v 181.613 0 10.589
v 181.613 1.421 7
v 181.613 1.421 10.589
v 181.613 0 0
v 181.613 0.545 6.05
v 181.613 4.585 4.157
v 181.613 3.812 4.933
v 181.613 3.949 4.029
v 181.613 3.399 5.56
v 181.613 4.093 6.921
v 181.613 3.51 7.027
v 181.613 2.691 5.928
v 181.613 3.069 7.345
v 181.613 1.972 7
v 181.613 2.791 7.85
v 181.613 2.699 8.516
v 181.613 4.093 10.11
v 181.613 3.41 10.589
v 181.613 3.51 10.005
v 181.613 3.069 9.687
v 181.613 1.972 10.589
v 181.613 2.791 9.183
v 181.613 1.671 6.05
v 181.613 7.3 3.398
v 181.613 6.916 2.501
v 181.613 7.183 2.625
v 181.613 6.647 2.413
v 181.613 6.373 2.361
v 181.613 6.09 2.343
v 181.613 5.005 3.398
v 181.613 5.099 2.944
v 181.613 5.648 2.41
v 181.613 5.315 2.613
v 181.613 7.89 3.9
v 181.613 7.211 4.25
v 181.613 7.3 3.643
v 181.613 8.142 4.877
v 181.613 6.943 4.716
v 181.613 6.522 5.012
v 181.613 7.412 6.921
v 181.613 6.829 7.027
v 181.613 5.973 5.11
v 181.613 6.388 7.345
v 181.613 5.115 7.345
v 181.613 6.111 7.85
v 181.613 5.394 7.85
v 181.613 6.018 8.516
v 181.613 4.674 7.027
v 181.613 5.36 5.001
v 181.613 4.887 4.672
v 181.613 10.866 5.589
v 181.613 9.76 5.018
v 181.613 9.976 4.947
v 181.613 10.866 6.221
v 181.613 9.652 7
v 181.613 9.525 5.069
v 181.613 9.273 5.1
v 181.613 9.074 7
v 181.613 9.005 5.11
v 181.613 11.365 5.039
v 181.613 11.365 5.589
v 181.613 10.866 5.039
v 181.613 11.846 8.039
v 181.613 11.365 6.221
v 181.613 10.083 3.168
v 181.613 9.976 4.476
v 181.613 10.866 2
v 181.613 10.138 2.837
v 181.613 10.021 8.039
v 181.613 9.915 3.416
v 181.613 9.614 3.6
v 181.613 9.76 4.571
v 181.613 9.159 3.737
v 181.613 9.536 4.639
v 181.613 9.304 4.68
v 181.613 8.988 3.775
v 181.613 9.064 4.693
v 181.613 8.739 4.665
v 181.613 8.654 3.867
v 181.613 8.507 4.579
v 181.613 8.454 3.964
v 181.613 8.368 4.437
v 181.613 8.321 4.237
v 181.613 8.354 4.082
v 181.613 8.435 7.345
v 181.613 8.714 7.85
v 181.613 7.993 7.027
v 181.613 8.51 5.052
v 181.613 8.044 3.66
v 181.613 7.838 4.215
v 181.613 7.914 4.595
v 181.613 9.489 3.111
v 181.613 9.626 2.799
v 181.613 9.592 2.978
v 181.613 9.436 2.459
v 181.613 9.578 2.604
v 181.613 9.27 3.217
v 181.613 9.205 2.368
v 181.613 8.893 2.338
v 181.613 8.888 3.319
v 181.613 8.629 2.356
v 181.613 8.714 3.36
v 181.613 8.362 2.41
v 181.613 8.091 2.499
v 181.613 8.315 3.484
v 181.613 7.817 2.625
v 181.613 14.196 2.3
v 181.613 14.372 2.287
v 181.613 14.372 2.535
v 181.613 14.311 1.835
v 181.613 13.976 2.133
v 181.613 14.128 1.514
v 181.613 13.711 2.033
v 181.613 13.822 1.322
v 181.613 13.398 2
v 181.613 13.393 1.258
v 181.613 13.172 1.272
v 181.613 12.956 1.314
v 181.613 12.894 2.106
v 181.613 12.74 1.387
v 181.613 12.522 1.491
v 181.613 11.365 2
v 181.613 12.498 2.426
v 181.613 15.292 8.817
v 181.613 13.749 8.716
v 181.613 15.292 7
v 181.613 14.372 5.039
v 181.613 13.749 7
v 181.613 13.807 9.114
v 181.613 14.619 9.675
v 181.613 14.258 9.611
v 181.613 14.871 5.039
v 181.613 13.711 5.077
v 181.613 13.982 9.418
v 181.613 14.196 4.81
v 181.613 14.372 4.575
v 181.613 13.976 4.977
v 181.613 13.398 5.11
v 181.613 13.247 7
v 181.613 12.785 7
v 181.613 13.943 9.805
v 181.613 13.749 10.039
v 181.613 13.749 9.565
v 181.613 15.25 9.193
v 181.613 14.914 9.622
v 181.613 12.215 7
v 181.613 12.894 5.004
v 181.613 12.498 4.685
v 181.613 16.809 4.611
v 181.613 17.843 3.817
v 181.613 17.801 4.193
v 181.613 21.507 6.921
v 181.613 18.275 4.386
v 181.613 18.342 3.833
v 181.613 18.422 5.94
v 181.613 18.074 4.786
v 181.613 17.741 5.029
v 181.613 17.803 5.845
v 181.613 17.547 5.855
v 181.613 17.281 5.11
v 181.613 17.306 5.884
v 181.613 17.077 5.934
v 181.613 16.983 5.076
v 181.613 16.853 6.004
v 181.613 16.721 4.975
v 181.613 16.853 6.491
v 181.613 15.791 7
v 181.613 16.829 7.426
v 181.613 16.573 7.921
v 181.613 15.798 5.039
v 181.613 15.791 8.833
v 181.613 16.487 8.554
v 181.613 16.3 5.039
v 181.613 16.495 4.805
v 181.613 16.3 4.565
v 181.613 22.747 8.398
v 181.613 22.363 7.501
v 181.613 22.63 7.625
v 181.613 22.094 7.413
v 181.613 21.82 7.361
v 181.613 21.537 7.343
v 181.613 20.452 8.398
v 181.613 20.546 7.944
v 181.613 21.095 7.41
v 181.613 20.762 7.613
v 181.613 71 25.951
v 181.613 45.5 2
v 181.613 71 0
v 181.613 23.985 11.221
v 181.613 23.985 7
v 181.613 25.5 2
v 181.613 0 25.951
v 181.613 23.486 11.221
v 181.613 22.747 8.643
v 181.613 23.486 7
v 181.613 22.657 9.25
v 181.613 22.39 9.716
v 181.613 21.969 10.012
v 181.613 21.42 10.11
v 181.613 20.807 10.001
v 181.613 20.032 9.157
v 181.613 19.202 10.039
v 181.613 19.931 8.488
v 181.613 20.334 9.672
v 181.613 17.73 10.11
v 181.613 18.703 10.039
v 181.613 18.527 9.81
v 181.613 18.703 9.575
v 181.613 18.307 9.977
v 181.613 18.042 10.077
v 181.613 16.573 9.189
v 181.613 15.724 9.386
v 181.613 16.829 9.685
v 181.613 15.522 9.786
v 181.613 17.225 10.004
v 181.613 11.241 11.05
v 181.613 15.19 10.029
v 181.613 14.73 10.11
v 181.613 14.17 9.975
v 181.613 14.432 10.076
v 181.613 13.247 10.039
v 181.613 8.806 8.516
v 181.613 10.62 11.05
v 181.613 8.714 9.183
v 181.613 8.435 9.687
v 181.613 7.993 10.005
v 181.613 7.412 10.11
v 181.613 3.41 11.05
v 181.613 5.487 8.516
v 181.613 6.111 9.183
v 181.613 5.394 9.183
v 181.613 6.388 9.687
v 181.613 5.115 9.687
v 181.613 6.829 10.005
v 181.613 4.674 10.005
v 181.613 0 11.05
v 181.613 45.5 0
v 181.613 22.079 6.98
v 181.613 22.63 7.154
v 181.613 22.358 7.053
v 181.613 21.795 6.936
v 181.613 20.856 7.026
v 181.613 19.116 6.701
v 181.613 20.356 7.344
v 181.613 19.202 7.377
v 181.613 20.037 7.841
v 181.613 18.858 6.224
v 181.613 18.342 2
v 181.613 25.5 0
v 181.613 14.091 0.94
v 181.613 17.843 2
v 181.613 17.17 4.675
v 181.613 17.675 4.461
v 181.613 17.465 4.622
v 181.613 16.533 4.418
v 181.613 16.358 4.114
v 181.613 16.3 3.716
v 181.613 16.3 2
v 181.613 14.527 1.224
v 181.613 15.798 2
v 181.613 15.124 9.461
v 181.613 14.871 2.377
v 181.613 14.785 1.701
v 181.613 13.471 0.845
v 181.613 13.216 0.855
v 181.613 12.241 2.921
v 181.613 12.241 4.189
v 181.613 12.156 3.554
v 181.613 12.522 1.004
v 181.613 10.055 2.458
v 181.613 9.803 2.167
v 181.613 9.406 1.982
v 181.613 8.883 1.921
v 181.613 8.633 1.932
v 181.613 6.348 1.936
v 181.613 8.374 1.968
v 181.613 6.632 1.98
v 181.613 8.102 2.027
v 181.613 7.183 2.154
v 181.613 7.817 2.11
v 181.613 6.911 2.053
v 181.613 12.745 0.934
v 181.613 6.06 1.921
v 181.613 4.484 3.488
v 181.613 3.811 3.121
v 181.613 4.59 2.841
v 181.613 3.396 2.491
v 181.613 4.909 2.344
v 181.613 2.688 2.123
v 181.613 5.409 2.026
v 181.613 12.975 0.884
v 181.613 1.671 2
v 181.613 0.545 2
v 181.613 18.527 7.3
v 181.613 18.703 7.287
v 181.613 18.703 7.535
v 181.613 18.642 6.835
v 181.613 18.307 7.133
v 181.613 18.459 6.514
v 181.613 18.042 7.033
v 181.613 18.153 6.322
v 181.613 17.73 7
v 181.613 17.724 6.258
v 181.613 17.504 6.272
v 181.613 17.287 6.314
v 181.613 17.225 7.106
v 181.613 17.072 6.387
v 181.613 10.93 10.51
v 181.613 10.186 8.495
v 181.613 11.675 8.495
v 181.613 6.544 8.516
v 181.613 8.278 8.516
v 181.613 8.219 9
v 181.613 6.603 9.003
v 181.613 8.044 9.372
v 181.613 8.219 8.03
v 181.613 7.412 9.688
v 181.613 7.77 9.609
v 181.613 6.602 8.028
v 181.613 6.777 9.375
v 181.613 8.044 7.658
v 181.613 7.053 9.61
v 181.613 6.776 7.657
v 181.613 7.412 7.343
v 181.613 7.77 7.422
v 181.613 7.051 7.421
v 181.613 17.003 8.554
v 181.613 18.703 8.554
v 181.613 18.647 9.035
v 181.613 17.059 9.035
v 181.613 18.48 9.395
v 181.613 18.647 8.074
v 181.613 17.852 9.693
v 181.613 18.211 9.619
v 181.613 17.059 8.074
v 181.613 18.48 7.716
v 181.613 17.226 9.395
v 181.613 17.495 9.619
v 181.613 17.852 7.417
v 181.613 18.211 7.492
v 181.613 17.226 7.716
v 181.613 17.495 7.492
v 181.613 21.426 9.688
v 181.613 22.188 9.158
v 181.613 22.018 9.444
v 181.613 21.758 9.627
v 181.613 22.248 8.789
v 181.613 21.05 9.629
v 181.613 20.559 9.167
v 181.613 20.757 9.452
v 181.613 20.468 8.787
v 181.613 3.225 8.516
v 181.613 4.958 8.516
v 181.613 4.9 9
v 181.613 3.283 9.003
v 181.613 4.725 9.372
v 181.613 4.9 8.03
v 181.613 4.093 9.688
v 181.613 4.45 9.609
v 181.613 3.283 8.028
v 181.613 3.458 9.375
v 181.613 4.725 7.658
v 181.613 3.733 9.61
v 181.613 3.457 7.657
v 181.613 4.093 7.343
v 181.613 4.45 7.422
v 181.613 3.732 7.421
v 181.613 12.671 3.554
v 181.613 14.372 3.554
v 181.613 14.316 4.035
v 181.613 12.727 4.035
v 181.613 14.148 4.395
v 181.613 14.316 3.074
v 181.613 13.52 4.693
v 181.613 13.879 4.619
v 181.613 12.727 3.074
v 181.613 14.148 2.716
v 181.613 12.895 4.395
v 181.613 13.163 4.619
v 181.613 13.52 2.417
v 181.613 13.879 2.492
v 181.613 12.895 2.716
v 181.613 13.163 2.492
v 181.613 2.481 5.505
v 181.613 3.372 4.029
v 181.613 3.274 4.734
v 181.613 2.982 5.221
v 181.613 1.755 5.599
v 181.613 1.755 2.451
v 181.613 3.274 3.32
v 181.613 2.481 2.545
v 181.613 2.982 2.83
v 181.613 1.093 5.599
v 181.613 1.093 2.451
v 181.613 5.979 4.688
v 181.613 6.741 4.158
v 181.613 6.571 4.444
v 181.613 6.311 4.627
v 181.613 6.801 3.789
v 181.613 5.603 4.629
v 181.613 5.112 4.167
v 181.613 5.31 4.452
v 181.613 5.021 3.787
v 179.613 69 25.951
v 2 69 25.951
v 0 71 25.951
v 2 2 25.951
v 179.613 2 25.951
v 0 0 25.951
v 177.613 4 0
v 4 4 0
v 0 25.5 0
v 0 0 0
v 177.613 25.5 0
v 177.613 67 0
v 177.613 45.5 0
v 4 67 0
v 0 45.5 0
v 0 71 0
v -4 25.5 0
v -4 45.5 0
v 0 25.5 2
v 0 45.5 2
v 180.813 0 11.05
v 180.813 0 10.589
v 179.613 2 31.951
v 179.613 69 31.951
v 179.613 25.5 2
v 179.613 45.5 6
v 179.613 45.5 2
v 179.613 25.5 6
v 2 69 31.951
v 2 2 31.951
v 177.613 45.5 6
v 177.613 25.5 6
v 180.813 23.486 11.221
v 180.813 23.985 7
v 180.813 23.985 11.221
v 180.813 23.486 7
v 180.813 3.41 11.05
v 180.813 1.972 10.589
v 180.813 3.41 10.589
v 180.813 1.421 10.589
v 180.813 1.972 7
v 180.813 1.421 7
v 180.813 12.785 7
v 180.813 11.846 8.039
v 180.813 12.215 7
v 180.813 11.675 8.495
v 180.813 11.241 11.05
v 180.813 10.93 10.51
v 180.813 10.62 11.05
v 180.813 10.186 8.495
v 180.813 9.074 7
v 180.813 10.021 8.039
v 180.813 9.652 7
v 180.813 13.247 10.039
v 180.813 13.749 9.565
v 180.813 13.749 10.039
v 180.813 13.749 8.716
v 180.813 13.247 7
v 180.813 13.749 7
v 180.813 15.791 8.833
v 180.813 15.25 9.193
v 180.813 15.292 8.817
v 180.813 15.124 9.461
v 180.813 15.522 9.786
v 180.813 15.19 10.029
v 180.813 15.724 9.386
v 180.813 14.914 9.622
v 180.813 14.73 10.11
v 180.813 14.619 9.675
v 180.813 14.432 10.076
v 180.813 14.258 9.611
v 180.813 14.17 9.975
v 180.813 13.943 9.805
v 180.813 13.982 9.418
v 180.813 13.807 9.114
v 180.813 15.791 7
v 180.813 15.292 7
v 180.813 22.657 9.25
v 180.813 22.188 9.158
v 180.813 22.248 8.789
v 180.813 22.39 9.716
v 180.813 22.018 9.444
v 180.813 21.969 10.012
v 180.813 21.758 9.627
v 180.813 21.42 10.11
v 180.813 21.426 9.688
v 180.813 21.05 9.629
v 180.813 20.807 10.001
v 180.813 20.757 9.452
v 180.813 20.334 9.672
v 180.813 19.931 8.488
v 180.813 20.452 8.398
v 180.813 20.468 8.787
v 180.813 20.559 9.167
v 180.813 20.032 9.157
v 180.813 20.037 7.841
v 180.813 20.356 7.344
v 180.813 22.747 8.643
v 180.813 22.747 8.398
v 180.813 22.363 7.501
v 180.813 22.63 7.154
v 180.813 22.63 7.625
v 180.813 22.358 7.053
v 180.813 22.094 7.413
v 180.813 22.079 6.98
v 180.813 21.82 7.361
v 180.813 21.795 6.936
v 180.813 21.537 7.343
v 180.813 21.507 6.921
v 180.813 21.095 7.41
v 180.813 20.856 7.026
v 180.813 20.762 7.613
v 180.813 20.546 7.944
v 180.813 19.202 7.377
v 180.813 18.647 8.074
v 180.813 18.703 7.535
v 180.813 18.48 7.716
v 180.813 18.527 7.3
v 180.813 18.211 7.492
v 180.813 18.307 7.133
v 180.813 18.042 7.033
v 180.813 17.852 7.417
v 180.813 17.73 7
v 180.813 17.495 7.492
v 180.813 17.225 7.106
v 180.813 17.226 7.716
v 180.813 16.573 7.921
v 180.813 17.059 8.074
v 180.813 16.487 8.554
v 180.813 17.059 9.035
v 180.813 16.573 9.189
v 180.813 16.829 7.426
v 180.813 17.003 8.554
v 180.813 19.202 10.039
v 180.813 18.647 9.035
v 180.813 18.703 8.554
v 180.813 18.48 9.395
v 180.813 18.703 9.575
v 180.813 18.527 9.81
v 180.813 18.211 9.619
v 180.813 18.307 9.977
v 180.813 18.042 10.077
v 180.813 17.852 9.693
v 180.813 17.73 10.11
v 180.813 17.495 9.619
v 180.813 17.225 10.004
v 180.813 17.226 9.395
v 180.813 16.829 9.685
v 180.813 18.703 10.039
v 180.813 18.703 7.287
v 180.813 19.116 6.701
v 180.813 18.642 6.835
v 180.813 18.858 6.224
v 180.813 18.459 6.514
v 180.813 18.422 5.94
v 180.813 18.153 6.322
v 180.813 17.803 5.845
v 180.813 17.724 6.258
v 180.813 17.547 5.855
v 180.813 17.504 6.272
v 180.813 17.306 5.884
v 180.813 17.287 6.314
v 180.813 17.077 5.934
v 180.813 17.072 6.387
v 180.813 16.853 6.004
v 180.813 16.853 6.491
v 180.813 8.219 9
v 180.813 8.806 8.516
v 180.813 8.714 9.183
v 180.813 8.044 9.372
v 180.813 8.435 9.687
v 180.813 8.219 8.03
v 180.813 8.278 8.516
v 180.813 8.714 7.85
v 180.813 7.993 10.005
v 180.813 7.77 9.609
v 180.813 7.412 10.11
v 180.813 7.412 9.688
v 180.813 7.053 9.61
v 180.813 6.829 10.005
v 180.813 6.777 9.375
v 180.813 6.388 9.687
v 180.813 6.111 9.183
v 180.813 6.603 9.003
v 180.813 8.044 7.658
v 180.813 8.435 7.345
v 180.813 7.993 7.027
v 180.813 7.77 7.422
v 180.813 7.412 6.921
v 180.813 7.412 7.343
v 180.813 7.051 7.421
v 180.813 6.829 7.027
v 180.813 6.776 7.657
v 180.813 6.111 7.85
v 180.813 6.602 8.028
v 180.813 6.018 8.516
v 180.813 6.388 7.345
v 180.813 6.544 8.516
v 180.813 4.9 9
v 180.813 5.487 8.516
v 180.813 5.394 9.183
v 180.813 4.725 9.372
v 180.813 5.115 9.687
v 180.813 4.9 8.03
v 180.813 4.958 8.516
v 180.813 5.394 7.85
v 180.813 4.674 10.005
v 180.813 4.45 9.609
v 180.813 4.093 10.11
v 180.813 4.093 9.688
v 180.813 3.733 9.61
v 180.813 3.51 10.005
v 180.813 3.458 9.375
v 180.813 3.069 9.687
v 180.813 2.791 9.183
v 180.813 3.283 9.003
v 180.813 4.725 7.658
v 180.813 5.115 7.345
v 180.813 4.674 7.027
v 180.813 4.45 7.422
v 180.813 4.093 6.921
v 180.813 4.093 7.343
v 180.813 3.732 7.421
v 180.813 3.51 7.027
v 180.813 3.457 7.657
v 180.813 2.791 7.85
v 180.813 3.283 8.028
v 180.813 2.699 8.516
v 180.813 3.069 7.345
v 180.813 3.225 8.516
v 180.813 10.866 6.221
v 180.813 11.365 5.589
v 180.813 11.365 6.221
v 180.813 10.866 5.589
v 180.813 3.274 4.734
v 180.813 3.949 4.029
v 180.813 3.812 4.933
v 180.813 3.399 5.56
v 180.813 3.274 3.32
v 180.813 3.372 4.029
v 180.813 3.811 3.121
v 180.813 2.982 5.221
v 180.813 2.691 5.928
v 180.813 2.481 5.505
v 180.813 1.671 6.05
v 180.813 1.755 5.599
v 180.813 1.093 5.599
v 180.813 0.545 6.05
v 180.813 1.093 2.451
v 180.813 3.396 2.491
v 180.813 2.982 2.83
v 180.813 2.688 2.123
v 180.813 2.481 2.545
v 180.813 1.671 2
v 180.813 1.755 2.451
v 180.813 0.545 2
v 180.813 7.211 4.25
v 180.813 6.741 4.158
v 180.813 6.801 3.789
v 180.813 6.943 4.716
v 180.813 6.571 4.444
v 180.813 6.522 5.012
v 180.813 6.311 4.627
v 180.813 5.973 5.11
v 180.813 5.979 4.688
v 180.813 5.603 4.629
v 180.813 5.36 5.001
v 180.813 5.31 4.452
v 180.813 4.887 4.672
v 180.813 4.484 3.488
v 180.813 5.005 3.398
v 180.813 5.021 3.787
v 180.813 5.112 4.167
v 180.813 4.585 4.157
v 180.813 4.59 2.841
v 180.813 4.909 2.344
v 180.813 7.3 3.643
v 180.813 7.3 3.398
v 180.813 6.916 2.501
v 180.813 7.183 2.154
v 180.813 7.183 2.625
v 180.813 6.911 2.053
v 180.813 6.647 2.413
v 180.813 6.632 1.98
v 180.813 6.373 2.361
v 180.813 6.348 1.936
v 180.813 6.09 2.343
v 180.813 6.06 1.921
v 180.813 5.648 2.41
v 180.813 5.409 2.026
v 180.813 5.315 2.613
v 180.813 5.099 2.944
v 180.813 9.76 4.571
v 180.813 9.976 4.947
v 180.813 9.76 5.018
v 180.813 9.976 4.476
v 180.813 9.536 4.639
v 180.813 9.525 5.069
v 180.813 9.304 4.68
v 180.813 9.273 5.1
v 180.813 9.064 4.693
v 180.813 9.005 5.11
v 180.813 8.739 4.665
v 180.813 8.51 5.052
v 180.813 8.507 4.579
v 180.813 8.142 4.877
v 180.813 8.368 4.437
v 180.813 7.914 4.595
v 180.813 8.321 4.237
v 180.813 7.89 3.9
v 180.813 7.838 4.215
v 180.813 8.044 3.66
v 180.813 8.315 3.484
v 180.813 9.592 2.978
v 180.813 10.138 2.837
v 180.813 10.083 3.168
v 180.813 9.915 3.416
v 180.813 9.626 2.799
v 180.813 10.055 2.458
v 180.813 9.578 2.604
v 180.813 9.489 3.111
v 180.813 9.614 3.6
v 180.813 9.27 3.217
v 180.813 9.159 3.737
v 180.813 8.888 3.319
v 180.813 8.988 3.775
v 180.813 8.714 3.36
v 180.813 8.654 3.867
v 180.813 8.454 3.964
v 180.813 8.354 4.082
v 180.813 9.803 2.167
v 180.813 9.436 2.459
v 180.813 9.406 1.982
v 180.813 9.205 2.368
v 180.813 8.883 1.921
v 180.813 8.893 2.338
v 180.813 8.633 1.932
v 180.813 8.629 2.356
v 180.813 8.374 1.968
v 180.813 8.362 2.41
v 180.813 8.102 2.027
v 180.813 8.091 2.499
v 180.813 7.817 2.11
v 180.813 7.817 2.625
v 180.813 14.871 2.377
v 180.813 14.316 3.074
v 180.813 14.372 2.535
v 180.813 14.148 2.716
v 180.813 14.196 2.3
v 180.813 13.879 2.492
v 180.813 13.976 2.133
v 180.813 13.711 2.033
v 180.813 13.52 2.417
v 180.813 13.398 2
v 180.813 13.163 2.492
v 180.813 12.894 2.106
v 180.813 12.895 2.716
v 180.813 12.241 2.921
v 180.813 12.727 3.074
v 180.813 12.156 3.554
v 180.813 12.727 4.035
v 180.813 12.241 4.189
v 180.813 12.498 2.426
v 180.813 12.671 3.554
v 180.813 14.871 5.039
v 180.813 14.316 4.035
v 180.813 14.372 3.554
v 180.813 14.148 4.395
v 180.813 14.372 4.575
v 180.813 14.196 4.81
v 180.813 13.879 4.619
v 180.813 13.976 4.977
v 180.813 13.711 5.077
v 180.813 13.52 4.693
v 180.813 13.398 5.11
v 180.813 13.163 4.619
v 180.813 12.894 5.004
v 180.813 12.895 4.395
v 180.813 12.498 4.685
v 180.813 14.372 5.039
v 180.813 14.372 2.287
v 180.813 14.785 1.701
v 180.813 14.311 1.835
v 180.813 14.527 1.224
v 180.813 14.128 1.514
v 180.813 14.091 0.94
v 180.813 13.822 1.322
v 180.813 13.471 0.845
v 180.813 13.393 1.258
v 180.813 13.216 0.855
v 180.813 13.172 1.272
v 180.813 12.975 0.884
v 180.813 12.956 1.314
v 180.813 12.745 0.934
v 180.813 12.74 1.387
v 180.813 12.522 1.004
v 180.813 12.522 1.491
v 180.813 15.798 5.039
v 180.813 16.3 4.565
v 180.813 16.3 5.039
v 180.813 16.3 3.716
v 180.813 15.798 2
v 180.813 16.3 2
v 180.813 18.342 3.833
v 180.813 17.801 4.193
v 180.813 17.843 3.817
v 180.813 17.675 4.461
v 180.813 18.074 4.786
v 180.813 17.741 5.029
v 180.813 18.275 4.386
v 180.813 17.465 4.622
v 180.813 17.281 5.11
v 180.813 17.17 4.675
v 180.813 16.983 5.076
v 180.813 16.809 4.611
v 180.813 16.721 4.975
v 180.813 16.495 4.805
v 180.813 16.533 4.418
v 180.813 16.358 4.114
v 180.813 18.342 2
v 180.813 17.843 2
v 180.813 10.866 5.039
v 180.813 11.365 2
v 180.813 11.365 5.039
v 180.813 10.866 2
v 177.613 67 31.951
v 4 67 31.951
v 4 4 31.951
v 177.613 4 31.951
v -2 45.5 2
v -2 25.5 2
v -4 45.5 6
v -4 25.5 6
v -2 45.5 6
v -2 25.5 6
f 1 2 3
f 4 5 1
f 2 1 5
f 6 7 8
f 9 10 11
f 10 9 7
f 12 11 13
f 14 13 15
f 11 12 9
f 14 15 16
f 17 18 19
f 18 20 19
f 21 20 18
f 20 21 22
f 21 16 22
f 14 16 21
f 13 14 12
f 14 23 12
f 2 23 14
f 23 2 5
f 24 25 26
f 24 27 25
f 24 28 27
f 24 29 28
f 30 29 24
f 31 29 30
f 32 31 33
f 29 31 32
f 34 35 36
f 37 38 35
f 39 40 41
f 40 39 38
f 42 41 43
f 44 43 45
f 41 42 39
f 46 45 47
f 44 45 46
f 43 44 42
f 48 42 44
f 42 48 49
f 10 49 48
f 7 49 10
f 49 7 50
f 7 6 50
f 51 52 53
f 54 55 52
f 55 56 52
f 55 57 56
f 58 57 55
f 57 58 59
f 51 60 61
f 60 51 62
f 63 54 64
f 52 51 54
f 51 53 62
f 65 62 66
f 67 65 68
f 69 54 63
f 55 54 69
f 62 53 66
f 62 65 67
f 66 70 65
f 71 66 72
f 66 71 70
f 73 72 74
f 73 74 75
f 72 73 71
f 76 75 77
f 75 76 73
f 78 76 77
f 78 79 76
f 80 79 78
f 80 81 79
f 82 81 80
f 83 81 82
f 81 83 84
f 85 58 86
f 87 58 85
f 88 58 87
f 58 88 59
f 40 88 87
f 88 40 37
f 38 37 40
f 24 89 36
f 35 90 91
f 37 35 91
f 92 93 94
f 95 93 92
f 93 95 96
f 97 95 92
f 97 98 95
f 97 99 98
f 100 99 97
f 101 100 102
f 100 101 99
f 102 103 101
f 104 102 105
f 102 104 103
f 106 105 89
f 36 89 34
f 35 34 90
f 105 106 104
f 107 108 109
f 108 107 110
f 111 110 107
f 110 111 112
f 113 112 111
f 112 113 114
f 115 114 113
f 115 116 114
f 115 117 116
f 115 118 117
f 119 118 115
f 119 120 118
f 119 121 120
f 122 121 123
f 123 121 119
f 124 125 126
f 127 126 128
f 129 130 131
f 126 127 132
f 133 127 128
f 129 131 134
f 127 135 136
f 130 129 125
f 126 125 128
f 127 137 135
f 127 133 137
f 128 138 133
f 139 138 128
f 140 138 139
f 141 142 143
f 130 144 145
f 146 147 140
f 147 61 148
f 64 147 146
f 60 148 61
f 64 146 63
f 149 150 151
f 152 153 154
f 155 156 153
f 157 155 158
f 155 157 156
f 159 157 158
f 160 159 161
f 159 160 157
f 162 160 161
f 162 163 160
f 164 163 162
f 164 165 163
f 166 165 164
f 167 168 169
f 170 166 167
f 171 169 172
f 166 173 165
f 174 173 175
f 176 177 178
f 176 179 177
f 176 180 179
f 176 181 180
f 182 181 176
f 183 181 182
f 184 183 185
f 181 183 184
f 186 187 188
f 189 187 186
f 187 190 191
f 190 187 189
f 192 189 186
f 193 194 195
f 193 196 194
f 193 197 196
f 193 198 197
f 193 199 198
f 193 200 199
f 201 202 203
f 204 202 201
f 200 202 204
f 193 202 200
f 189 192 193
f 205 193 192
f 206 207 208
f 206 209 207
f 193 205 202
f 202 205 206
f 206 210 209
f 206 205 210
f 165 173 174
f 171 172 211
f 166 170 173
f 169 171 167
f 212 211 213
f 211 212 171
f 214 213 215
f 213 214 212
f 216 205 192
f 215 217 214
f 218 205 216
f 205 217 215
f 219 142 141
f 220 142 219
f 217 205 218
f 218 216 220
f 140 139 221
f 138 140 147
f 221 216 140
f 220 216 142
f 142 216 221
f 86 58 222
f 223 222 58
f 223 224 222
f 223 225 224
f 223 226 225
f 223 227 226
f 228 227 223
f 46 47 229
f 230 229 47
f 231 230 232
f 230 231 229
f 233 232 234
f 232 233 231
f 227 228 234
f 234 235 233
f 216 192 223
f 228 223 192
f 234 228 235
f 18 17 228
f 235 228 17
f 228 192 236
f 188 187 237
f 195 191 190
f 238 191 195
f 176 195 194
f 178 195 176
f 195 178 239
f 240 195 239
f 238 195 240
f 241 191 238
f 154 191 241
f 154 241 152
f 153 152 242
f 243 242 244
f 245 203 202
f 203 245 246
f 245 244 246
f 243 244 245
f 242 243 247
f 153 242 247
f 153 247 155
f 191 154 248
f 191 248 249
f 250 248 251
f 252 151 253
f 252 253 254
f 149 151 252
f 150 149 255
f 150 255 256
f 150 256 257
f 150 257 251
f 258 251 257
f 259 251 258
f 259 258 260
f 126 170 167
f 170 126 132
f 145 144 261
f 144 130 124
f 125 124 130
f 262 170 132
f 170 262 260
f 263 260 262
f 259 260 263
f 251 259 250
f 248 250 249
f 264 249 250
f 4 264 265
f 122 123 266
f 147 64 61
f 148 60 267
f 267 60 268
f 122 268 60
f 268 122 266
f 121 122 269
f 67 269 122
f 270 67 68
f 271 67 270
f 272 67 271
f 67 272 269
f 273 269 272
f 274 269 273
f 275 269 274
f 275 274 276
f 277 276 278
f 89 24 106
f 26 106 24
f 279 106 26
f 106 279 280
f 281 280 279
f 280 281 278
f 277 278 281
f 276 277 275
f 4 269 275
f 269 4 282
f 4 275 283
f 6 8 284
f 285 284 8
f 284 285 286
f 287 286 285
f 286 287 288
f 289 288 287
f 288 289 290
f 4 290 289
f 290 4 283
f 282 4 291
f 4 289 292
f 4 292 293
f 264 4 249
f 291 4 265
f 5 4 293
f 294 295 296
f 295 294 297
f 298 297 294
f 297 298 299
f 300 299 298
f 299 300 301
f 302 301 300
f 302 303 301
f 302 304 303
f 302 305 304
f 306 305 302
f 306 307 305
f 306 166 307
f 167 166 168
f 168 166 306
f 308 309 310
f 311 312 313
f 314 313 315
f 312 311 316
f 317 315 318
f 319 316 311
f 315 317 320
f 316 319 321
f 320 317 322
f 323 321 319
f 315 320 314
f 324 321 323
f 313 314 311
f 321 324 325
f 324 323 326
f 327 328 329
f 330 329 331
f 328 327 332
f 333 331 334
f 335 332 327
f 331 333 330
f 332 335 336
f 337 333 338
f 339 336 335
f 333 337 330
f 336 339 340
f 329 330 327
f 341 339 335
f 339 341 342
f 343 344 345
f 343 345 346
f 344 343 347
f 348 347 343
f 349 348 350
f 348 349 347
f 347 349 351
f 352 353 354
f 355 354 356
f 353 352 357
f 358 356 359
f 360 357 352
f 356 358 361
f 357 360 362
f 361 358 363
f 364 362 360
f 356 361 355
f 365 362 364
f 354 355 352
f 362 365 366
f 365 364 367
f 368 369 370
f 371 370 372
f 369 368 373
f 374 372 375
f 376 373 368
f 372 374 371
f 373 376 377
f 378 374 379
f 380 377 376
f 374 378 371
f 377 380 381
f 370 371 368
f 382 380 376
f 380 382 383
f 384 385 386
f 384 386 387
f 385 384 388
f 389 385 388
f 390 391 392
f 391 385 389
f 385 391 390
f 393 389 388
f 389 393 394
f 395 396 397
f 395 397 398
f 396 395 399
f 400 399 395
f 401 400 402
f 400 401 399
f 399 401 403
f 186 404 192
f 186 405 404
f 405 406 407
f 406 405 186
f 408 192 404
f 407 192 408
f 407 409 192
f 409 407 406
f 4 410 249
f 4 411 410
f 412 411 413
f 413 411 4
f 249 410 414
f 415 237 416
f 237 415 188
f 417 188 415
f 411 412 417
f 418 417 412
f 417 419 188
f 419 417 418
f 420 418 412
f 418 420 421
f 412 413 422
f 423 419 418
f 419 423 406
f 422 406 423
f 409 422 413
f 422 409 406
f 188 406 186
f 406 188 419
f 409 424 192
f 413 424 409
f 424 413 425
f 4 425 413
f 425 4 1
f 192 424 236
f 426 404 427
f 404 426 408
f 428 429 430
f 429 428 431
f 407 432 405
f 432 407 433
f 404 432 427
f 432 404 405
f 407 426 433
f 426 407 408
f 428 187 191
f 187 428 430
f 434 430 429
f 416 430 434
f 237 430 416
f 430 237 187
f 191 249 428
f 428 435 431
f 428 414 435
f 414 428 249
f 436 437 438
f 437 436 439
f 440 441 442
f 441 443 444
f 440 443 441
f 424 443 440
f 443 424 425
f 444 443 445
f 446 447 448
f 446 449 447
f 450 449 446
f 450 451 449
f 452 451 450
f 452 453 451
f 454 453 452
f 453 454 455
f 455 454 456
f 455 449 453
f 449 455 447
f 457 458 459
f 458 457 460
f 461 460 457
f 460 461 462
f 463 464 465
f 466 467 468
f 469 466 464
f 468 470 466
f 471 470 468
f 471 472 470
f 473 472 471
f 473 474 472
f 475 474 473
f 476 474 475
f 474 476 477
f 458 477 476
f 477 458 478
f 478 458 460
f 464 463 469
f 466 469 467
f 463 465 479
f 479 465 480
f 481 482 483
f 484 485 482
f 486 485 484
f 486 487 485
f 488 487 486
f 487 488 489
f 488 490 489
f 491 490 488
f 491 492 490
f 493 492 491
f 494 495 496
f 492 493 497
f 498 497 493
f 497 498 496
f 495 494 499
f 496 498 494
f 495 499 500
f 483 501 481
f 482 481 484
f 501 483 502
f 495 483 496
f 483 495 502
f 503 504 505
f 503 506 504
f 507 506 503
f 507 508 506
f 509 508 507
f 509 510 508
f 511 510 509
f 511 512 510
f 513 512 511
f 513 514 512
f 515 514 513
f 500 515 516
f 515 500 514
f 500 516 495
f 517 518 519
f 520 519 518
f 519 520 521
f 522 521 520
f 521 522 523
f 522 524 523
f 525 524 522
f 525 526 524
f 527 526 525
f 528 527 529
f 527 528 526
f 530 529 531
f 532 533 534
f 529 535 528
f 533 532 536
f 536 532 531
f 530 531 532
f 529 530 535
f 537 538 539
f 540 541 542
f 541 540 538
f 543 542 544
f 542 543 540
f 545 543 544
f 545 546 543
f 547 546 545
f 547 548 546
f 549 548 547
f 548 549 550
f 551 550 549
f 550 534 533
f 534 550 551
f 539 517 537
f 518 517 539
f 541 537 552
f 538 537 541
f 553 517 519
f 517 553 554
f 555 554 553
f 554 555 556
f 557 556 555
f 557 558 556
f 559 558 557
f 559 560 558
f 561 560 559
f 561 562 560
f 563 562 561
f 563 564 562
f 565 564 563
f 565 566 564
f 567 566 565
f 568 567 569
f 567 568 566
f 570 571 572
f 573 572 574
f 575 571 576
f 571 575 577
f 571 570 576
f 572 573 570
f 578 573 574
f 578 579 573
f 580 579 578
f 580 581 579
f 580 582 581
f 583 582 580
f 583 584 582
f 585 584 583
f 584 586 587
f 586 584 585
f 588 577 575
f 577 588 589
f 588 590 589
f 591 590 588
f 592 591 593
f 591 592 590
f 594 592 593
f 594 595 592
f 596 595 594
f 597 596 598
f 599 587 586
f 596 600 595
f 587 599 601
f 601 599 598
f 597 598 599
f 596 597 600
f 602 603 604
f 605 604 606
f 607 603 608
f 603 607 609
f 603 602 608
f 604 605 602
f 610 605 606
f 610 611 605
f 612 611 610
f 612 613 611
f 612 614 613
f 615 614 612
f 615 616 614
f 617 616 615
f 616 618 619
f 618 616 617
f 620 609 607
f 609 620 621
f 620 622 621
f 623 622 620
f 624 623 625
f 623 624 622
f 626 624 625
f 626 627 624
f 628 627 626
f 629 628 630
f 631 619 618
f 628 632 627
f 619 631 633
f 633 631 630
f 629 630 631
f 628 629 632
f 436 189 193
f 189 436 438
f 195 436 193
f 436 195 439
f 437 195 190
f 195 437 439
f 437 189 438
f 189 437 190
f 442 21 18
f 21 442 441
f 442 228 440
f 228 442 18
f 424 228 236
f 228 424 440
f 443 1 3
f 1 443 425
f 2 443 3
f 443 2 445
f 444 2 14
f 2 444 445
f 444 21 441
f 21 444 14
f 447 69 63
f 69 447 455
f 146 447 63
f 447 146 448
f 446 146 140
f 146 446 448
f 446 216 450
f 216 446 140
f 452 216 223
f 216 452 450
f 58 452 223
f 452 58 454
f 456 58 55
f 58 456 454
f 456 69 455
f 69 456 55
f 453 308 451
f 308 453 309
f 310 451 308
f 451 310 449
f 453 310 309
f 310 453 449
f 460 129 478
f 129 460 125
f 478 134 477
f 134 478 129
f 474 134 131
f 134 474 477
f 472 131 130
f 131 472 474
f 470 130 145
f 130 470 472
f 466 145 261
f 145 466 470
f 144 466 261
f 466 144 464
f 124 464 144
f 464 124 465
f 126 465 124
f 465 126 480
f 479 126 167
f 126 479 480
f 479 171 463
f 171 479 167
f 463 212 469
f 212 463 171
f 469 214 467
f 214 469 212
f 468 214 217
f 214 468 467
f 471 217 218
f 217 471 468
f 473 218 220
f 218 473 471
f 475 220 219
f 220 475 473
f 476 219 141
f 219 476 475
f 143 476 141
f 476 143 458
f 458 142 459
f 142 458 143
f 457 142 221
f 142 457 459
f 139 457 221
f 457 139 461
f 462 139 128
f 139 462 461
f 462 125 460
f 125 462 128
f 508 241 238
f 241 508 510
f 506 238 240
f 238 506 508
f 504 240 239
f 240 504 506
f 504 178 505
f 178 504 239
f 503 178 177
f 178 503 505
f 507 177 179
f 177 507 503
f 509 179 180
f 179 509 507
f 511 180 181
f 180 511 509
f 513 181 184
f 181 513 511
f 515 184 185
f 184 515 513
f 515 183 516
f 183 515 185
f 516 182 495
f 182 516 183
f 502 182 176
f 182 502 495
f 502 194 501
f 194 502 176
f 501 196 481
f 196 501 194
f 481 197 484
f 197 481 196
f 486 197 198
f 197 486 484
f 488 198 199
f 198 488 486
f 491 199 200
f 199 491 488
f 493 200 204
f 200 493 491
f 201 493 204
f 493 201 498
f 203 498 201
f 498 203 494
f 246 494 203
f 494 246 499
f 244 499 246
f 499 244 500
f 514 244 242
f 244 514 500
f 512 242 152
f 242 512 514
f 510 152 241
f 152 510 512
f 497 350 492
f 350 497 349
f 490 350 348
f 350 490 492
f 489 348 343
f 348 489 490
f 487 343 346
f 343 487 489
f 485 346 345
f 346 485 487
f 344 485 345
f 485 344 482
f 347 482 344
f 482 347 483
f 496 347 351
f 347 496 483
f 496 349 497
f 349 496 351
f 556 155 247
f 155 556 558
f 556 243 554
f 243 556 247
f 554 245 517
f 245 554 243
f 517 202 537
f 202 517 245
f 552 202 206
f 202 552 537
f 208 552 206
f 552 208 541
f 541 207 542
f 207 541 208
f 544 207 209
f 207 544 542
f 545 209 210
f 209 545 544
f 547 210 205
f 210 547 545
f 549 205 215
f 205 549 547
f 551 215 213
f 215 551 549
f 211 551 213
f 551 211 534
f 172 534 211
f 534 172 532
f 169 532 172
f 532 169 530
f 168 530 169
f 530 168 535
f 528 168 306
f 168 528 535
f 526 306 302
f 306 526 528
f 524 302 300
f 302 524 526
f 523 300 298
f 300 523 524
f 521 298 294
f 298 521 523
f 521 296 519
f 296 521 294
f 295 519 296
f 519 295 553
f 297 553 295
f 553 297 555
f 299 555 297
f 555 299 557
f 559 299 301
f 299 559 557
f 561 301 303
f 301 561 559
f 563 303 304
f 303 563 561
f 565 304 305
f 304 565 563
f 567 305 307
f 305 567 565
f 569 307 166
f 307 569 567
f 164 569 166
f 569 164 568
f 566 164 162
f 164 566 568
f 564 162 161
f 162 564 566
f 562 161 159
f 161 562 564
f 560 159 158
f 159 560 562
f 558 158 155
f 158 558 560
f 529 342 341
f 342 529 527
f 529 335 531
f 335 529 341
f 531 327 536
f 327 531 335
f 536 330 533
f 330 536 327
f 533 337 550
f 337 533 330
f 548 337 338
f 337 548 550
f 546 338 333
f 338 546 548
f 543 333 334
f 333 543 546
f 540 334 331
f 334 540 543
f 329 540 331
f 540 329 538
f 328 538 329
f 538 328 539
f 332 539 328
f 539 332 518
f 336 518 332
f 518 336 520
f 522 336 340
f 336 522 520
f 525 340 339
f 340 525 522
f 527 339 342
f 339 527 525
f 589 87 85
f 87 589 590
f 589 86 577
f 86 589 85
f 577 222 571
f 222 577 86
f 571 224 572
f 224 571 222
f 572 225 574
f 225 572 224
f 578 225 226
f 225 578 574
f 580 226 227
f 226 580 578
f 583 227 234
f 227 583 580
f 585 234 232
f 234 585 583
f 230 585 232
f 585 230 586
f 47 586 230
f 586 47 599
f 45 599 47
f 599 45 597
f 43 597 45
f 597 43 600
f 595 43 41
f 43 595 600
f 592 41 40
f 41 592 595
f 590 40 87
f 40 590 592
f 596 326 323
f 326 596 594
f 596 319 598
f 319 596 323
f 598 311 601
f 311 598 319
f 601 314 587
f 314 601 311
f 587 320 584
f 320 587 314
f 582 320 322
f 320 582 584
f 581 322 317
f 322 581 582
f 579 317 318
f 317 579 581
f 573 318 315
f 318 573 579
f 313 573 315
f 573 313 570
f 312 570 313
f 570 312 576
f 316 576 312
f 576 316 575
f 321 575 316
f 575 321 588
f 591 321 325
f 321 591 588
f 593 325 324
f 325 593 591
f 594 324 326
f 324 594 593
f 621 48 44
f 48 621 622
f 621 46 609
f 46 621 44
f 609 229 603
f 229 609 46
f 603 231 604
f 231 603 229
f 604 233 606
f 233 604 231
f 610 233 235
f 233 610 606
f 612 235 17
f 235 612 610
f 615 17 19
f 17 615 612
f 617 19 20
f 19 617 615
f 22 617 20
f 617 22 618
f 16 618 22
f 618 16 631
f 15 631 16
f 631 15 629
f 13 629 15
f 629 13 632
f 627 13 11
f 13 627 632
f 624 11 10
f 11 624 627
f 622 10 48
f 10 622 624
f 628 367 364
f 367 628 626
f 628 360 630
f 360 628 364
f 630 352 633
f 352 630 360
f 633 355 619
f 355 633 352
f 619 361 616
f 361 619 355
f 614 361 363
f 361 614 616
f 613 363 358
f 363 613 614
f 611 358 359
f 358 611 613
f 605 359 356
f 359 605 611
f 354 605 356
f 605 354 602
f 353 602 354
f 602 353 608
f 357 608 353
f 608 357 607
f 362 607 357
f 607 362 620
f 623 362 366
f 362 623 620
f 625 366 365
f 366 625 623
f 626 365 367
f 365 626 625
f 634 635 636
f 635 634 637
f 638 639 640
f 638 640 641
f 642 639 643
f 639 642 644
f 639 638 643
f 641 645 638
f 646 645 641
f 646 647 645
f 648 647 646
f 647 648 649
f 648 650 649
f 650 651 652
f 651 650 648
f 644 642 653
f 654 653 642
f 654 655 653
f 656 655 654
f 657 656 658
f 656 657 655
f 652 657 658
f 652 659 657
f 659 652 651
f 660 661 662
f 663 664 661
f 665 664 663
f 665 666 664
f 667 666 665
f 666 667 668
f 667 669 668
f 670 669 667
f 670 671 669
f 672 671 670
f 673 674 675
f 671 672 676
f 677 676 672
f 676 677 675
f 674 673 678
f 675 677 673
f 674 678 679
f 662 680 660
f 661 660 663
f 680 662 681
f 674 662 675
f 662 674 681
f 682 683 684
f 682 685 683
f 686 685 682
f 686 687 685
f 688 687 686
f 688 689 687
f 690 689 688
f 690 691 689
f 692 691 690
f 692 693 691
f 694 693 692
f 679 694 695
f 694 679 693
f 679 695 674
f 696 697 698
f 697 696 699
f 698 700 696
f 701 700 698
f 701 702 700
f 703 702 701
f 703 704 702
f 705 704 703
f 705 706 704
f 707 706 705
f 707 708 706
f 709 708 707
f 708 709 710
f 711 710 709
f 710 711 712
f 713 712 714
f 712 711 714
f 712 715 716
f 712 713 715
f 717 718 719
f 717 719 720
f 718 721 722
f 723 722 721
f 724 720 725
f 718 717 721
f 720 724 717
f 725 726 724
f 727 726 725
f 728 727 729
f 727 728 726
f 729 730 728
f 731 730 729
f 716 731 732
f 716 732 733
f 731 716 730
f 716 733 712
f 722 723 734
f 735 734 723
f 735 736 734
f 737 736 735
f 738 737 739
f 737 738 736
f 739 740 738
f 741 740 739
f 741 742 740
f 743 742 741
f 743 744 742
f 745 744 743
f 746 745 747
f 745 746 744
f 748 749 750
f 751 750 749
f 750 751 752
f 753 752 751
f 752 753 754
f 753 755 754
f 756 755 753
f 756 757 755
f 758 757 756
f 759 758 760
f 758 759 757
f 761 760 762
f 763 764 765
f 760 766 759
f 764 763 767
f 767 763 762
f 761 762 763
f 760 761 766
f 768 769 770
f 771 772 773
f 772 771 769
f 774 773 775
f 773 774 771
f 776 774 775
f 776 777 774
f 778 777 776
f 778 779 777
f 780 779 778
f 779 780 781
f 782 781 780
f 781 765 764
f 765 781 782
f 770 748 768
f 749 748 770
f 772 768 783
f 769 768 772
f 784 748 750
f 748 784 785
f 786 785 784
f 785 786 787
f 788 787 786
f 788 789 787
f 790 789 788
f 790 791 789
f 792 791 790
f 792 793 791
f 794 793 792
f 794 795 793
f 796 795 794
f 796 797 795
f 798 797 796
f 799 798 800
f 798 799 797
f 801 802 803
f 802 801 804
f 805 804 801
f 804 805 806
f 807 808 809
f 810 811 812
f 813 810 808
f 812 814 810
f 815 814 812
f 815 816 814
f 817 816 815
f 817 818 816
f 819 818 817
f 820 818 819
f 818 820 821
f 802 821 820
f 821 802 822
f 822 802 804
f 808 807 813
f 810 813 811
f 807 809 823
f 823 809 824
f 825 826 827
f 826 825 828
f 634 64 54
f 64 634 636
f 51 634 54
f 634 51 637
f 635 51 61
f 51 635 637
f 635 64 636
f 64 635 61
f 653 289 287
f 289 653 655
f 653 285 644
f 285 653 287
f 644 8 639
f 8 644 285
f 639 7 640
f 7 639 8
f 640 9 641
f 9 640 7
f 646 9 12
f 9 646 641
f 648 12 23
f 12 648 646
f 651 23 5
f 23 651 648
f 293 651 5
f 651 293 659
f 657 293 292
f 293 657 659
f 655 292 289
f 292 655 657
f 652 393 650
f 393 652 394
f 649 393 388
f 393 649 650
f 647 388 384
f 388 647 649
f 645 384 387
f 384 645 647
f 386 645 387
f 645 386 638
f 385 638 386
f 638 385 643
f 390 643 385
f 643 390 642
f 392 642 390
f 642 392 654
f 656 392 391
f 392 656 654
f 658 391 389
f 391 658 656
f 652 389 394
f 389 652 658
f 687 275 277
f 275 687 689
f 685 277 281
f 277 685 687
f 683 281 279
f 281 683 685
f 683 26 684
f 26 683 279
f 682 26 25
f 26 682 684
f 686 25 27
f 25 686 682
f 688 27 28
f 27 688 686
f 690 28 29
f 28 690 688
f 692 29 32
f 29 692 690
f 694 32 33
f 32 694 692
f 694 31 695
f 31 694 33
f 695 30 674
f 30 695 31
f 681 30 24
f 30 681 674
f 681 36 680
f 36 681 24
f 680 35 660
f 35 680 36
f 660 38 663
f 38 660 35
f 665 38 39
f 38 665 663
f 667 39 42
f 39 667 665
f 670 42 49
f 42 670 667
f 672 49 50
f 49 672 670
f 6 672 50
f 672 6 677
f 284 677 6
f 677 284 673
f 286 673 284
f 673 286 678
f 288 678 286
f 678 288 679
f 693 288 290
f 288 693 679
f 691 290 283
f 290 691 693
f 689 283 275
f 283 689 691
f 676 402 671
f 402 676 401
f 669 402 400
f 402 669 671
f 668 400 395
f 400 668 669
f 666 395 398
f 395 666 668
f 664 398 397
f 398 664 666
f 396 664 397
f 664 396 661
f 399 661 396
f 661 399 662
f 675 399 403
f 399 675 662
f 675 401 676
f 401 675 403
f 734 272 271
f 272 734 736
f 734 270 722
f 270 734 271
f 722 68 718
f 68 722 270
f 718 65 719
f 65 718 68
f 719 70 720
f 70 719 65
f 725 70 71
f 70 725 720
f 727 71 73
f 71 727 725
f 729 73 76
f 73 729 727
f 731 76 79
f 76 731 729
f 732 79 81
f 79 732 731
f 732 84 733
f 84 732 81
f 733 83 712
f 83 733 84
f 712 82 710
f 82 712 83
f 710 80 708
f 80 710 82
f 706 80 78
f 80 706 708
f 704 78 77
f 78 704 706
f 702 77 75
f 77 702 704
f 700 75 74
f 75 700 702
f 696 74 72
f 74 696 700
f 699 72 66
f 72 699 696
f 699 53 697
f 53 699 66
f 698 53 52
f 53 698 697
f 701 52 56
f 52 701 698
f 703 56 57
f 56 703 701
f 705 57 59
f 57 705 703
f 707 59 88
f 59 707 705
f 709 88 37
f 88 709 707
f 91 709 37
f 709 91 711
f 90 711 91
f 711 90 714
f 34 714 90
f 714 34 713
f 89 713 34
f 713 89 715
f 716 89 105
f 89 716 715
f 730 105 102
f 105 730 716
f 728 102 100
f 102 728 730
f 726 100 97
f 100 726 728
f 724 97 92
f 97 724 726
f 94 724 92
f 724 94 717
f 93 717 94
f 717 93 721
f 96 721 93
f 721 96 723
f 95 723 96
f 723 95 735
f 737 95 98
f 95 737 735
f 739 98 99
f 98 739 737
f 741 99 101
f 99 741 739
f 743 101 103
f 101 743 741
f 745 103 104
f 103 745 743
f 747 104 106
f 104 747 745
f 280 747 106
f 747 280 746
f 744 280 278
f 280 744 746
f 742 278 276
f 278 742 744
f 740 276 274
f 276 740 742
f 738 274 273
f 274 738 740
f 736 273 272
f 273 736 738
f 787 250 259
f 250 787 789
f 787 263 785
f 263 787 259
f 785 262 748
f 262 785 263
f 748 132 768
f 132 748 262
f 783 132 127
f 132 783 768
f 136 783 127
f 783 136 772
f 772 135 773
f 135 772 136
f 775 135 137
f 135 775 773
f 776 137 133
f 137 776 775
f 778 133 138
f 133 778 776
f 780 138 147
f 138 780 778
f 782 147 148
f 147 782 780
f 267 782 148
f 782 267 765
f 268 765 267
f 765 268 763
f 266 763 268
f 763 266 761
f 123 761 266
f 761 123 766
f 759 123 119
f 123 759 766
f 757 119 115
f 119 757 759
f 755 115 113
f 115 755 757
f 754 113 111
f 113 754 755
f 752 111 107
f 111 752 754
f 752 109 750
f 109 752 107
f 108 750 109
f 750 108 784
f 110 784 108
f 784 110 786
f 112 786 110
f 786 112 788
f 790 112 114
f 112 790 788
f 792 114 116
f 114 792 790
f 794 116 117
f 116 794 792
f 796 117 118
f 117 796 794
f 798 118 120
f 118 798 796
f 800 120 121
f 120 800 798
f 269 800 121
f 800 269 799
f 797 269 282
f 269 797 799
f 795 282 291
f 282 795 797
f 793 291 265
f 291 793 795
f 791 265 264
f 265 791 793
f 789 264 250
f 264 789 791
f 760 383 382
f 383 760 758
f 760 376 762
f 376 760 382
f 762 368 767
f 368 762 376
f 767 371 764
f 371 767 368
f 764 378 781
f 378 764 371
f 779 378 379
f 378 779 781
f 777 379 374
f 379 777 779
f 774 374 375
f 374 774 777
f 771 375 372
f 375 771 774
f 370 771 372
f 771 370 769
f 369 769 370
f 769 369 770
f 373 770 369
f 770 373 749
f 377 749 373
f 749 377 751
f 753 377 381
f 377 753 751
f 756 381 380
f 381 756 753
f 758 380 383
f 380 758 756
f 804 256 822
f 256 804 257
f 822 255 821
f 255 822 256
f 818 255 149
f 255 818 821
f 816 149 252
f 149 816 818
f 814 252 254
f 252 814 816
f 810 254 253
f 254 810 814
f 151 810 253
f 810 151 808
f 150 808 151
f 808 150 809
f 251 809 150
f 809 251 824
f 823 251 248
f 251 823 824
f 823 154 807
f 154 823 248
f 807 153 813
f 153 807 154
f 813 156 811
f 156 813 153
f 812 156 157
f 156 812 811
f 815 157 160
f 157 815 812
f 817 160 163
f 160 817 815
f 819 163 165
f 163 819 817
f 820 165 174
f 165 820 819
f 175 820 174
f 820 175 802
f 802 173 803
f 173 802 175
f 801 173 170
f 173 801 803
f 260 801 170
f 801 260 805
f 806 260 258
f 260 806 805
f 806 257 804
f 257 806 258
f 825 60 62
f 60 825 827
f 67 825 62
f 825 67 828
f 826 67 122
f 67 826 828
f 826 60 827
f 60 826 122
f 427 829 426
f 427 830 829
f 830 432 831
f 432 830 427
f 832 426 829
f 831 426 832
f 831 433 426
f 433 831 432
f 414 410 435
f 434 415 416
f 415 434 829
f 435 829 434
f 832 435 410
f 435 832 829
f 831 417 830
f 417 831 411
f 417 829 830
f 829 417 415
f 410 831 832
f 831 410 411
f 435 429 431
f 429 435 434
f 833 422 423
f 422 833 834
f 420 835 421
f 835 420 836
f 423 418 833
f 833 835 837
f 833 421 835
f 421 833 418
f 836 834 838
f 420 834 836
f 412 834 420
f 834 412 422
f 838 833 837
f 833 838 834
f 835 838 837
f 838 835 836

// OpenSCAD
accus = 10;
gradient = 10;
accu_diameter = 18; 
accu_length = 67; // 65 plus padding
thickness = 2;


length = accus * accu_diameter;

// Height
// sin alpha = opposite / hypothenuse
// height = length * sin gradient
height = length * sin(gradient);
echo("Height: ", height);

// Base offset
// Due to different ankle
// sin alpha = opposite / hypothenuse
// base_offset = thickness * sin gradient
base_offset = thickness * sin(gradient);
echo("Base offset: ", base_offset);

// Case length
// cos alpha = adjacent / hypothenuse
// case_length = length * cos gradient
case_length = length * cos(gradient) + base_offset;
echo("Case length: ", case_length);

// Grip offset
// sin alpha = opposite / hypothenuse
// grip_offset = accu_diameter / 2 * sin gradient
grip_offset = accu_diameter / 2 * sin(gradient);
echo("Grip offset: ", grip_offset);

back_height = sin(gradient) * (length + 2 * thickness);

hook_length = 20;

// hook
translate([-2 * thickness, (accu_length + 2 * thickness) / 2 - hook_length / 2, 0]) cube([2 * thickness, hook_length, thickness]);
translate([-2 * thickness, (accu_length + 2 * thickness) / 2 - hook_length / 2, thickness]) cube([thickness, hook_length, 2 * thickness]);


difference() {
    cube([case_length + 2 * thickness, accu_length + 2 * thickness, back_height - (3 * thickness)]);
    translate([thickness, thickness, 0]) cube([case_length, accu_length, back_height - (3 * thickness)]);
    
    // hole for hook
    translate([case_length + thickness, (accu_length + 2 * thickness) / 2 - hook_length / 2, 0]) cube([thickness, hook_length, thickness]);
    
    translate([case_length + 1.6 * thickness, 0, 7]) rotate([90, 0, 90]) linear_extrude(thickness / 2) text("TooAngel", size=4, font="Deftone Stylus:style=Regular");
    translate([case_length + 1.6 * thickness, 0, 2]) rotate([90, 0, 90]) linear_extrude(thickness / 2) text("Design", size=4, font="Deftone Stylus:style=Regular");
}

// frame
translate([thickness, thickness, 0])
difference() {
    cube([case_length, accu_length, back_height]);
    translate([thickness, thickness, 0]) cube([case_length - 2 * thickness, accu_length - 2 * thickness, back_height]);
    
    // hole for hook
    translate([case_length - thickness, (accu_length + 2 * thickness) / 2 - hook_length / 2 - thickness, 0]) cube([thickness, hook_length, 3 * thickness]);
}
